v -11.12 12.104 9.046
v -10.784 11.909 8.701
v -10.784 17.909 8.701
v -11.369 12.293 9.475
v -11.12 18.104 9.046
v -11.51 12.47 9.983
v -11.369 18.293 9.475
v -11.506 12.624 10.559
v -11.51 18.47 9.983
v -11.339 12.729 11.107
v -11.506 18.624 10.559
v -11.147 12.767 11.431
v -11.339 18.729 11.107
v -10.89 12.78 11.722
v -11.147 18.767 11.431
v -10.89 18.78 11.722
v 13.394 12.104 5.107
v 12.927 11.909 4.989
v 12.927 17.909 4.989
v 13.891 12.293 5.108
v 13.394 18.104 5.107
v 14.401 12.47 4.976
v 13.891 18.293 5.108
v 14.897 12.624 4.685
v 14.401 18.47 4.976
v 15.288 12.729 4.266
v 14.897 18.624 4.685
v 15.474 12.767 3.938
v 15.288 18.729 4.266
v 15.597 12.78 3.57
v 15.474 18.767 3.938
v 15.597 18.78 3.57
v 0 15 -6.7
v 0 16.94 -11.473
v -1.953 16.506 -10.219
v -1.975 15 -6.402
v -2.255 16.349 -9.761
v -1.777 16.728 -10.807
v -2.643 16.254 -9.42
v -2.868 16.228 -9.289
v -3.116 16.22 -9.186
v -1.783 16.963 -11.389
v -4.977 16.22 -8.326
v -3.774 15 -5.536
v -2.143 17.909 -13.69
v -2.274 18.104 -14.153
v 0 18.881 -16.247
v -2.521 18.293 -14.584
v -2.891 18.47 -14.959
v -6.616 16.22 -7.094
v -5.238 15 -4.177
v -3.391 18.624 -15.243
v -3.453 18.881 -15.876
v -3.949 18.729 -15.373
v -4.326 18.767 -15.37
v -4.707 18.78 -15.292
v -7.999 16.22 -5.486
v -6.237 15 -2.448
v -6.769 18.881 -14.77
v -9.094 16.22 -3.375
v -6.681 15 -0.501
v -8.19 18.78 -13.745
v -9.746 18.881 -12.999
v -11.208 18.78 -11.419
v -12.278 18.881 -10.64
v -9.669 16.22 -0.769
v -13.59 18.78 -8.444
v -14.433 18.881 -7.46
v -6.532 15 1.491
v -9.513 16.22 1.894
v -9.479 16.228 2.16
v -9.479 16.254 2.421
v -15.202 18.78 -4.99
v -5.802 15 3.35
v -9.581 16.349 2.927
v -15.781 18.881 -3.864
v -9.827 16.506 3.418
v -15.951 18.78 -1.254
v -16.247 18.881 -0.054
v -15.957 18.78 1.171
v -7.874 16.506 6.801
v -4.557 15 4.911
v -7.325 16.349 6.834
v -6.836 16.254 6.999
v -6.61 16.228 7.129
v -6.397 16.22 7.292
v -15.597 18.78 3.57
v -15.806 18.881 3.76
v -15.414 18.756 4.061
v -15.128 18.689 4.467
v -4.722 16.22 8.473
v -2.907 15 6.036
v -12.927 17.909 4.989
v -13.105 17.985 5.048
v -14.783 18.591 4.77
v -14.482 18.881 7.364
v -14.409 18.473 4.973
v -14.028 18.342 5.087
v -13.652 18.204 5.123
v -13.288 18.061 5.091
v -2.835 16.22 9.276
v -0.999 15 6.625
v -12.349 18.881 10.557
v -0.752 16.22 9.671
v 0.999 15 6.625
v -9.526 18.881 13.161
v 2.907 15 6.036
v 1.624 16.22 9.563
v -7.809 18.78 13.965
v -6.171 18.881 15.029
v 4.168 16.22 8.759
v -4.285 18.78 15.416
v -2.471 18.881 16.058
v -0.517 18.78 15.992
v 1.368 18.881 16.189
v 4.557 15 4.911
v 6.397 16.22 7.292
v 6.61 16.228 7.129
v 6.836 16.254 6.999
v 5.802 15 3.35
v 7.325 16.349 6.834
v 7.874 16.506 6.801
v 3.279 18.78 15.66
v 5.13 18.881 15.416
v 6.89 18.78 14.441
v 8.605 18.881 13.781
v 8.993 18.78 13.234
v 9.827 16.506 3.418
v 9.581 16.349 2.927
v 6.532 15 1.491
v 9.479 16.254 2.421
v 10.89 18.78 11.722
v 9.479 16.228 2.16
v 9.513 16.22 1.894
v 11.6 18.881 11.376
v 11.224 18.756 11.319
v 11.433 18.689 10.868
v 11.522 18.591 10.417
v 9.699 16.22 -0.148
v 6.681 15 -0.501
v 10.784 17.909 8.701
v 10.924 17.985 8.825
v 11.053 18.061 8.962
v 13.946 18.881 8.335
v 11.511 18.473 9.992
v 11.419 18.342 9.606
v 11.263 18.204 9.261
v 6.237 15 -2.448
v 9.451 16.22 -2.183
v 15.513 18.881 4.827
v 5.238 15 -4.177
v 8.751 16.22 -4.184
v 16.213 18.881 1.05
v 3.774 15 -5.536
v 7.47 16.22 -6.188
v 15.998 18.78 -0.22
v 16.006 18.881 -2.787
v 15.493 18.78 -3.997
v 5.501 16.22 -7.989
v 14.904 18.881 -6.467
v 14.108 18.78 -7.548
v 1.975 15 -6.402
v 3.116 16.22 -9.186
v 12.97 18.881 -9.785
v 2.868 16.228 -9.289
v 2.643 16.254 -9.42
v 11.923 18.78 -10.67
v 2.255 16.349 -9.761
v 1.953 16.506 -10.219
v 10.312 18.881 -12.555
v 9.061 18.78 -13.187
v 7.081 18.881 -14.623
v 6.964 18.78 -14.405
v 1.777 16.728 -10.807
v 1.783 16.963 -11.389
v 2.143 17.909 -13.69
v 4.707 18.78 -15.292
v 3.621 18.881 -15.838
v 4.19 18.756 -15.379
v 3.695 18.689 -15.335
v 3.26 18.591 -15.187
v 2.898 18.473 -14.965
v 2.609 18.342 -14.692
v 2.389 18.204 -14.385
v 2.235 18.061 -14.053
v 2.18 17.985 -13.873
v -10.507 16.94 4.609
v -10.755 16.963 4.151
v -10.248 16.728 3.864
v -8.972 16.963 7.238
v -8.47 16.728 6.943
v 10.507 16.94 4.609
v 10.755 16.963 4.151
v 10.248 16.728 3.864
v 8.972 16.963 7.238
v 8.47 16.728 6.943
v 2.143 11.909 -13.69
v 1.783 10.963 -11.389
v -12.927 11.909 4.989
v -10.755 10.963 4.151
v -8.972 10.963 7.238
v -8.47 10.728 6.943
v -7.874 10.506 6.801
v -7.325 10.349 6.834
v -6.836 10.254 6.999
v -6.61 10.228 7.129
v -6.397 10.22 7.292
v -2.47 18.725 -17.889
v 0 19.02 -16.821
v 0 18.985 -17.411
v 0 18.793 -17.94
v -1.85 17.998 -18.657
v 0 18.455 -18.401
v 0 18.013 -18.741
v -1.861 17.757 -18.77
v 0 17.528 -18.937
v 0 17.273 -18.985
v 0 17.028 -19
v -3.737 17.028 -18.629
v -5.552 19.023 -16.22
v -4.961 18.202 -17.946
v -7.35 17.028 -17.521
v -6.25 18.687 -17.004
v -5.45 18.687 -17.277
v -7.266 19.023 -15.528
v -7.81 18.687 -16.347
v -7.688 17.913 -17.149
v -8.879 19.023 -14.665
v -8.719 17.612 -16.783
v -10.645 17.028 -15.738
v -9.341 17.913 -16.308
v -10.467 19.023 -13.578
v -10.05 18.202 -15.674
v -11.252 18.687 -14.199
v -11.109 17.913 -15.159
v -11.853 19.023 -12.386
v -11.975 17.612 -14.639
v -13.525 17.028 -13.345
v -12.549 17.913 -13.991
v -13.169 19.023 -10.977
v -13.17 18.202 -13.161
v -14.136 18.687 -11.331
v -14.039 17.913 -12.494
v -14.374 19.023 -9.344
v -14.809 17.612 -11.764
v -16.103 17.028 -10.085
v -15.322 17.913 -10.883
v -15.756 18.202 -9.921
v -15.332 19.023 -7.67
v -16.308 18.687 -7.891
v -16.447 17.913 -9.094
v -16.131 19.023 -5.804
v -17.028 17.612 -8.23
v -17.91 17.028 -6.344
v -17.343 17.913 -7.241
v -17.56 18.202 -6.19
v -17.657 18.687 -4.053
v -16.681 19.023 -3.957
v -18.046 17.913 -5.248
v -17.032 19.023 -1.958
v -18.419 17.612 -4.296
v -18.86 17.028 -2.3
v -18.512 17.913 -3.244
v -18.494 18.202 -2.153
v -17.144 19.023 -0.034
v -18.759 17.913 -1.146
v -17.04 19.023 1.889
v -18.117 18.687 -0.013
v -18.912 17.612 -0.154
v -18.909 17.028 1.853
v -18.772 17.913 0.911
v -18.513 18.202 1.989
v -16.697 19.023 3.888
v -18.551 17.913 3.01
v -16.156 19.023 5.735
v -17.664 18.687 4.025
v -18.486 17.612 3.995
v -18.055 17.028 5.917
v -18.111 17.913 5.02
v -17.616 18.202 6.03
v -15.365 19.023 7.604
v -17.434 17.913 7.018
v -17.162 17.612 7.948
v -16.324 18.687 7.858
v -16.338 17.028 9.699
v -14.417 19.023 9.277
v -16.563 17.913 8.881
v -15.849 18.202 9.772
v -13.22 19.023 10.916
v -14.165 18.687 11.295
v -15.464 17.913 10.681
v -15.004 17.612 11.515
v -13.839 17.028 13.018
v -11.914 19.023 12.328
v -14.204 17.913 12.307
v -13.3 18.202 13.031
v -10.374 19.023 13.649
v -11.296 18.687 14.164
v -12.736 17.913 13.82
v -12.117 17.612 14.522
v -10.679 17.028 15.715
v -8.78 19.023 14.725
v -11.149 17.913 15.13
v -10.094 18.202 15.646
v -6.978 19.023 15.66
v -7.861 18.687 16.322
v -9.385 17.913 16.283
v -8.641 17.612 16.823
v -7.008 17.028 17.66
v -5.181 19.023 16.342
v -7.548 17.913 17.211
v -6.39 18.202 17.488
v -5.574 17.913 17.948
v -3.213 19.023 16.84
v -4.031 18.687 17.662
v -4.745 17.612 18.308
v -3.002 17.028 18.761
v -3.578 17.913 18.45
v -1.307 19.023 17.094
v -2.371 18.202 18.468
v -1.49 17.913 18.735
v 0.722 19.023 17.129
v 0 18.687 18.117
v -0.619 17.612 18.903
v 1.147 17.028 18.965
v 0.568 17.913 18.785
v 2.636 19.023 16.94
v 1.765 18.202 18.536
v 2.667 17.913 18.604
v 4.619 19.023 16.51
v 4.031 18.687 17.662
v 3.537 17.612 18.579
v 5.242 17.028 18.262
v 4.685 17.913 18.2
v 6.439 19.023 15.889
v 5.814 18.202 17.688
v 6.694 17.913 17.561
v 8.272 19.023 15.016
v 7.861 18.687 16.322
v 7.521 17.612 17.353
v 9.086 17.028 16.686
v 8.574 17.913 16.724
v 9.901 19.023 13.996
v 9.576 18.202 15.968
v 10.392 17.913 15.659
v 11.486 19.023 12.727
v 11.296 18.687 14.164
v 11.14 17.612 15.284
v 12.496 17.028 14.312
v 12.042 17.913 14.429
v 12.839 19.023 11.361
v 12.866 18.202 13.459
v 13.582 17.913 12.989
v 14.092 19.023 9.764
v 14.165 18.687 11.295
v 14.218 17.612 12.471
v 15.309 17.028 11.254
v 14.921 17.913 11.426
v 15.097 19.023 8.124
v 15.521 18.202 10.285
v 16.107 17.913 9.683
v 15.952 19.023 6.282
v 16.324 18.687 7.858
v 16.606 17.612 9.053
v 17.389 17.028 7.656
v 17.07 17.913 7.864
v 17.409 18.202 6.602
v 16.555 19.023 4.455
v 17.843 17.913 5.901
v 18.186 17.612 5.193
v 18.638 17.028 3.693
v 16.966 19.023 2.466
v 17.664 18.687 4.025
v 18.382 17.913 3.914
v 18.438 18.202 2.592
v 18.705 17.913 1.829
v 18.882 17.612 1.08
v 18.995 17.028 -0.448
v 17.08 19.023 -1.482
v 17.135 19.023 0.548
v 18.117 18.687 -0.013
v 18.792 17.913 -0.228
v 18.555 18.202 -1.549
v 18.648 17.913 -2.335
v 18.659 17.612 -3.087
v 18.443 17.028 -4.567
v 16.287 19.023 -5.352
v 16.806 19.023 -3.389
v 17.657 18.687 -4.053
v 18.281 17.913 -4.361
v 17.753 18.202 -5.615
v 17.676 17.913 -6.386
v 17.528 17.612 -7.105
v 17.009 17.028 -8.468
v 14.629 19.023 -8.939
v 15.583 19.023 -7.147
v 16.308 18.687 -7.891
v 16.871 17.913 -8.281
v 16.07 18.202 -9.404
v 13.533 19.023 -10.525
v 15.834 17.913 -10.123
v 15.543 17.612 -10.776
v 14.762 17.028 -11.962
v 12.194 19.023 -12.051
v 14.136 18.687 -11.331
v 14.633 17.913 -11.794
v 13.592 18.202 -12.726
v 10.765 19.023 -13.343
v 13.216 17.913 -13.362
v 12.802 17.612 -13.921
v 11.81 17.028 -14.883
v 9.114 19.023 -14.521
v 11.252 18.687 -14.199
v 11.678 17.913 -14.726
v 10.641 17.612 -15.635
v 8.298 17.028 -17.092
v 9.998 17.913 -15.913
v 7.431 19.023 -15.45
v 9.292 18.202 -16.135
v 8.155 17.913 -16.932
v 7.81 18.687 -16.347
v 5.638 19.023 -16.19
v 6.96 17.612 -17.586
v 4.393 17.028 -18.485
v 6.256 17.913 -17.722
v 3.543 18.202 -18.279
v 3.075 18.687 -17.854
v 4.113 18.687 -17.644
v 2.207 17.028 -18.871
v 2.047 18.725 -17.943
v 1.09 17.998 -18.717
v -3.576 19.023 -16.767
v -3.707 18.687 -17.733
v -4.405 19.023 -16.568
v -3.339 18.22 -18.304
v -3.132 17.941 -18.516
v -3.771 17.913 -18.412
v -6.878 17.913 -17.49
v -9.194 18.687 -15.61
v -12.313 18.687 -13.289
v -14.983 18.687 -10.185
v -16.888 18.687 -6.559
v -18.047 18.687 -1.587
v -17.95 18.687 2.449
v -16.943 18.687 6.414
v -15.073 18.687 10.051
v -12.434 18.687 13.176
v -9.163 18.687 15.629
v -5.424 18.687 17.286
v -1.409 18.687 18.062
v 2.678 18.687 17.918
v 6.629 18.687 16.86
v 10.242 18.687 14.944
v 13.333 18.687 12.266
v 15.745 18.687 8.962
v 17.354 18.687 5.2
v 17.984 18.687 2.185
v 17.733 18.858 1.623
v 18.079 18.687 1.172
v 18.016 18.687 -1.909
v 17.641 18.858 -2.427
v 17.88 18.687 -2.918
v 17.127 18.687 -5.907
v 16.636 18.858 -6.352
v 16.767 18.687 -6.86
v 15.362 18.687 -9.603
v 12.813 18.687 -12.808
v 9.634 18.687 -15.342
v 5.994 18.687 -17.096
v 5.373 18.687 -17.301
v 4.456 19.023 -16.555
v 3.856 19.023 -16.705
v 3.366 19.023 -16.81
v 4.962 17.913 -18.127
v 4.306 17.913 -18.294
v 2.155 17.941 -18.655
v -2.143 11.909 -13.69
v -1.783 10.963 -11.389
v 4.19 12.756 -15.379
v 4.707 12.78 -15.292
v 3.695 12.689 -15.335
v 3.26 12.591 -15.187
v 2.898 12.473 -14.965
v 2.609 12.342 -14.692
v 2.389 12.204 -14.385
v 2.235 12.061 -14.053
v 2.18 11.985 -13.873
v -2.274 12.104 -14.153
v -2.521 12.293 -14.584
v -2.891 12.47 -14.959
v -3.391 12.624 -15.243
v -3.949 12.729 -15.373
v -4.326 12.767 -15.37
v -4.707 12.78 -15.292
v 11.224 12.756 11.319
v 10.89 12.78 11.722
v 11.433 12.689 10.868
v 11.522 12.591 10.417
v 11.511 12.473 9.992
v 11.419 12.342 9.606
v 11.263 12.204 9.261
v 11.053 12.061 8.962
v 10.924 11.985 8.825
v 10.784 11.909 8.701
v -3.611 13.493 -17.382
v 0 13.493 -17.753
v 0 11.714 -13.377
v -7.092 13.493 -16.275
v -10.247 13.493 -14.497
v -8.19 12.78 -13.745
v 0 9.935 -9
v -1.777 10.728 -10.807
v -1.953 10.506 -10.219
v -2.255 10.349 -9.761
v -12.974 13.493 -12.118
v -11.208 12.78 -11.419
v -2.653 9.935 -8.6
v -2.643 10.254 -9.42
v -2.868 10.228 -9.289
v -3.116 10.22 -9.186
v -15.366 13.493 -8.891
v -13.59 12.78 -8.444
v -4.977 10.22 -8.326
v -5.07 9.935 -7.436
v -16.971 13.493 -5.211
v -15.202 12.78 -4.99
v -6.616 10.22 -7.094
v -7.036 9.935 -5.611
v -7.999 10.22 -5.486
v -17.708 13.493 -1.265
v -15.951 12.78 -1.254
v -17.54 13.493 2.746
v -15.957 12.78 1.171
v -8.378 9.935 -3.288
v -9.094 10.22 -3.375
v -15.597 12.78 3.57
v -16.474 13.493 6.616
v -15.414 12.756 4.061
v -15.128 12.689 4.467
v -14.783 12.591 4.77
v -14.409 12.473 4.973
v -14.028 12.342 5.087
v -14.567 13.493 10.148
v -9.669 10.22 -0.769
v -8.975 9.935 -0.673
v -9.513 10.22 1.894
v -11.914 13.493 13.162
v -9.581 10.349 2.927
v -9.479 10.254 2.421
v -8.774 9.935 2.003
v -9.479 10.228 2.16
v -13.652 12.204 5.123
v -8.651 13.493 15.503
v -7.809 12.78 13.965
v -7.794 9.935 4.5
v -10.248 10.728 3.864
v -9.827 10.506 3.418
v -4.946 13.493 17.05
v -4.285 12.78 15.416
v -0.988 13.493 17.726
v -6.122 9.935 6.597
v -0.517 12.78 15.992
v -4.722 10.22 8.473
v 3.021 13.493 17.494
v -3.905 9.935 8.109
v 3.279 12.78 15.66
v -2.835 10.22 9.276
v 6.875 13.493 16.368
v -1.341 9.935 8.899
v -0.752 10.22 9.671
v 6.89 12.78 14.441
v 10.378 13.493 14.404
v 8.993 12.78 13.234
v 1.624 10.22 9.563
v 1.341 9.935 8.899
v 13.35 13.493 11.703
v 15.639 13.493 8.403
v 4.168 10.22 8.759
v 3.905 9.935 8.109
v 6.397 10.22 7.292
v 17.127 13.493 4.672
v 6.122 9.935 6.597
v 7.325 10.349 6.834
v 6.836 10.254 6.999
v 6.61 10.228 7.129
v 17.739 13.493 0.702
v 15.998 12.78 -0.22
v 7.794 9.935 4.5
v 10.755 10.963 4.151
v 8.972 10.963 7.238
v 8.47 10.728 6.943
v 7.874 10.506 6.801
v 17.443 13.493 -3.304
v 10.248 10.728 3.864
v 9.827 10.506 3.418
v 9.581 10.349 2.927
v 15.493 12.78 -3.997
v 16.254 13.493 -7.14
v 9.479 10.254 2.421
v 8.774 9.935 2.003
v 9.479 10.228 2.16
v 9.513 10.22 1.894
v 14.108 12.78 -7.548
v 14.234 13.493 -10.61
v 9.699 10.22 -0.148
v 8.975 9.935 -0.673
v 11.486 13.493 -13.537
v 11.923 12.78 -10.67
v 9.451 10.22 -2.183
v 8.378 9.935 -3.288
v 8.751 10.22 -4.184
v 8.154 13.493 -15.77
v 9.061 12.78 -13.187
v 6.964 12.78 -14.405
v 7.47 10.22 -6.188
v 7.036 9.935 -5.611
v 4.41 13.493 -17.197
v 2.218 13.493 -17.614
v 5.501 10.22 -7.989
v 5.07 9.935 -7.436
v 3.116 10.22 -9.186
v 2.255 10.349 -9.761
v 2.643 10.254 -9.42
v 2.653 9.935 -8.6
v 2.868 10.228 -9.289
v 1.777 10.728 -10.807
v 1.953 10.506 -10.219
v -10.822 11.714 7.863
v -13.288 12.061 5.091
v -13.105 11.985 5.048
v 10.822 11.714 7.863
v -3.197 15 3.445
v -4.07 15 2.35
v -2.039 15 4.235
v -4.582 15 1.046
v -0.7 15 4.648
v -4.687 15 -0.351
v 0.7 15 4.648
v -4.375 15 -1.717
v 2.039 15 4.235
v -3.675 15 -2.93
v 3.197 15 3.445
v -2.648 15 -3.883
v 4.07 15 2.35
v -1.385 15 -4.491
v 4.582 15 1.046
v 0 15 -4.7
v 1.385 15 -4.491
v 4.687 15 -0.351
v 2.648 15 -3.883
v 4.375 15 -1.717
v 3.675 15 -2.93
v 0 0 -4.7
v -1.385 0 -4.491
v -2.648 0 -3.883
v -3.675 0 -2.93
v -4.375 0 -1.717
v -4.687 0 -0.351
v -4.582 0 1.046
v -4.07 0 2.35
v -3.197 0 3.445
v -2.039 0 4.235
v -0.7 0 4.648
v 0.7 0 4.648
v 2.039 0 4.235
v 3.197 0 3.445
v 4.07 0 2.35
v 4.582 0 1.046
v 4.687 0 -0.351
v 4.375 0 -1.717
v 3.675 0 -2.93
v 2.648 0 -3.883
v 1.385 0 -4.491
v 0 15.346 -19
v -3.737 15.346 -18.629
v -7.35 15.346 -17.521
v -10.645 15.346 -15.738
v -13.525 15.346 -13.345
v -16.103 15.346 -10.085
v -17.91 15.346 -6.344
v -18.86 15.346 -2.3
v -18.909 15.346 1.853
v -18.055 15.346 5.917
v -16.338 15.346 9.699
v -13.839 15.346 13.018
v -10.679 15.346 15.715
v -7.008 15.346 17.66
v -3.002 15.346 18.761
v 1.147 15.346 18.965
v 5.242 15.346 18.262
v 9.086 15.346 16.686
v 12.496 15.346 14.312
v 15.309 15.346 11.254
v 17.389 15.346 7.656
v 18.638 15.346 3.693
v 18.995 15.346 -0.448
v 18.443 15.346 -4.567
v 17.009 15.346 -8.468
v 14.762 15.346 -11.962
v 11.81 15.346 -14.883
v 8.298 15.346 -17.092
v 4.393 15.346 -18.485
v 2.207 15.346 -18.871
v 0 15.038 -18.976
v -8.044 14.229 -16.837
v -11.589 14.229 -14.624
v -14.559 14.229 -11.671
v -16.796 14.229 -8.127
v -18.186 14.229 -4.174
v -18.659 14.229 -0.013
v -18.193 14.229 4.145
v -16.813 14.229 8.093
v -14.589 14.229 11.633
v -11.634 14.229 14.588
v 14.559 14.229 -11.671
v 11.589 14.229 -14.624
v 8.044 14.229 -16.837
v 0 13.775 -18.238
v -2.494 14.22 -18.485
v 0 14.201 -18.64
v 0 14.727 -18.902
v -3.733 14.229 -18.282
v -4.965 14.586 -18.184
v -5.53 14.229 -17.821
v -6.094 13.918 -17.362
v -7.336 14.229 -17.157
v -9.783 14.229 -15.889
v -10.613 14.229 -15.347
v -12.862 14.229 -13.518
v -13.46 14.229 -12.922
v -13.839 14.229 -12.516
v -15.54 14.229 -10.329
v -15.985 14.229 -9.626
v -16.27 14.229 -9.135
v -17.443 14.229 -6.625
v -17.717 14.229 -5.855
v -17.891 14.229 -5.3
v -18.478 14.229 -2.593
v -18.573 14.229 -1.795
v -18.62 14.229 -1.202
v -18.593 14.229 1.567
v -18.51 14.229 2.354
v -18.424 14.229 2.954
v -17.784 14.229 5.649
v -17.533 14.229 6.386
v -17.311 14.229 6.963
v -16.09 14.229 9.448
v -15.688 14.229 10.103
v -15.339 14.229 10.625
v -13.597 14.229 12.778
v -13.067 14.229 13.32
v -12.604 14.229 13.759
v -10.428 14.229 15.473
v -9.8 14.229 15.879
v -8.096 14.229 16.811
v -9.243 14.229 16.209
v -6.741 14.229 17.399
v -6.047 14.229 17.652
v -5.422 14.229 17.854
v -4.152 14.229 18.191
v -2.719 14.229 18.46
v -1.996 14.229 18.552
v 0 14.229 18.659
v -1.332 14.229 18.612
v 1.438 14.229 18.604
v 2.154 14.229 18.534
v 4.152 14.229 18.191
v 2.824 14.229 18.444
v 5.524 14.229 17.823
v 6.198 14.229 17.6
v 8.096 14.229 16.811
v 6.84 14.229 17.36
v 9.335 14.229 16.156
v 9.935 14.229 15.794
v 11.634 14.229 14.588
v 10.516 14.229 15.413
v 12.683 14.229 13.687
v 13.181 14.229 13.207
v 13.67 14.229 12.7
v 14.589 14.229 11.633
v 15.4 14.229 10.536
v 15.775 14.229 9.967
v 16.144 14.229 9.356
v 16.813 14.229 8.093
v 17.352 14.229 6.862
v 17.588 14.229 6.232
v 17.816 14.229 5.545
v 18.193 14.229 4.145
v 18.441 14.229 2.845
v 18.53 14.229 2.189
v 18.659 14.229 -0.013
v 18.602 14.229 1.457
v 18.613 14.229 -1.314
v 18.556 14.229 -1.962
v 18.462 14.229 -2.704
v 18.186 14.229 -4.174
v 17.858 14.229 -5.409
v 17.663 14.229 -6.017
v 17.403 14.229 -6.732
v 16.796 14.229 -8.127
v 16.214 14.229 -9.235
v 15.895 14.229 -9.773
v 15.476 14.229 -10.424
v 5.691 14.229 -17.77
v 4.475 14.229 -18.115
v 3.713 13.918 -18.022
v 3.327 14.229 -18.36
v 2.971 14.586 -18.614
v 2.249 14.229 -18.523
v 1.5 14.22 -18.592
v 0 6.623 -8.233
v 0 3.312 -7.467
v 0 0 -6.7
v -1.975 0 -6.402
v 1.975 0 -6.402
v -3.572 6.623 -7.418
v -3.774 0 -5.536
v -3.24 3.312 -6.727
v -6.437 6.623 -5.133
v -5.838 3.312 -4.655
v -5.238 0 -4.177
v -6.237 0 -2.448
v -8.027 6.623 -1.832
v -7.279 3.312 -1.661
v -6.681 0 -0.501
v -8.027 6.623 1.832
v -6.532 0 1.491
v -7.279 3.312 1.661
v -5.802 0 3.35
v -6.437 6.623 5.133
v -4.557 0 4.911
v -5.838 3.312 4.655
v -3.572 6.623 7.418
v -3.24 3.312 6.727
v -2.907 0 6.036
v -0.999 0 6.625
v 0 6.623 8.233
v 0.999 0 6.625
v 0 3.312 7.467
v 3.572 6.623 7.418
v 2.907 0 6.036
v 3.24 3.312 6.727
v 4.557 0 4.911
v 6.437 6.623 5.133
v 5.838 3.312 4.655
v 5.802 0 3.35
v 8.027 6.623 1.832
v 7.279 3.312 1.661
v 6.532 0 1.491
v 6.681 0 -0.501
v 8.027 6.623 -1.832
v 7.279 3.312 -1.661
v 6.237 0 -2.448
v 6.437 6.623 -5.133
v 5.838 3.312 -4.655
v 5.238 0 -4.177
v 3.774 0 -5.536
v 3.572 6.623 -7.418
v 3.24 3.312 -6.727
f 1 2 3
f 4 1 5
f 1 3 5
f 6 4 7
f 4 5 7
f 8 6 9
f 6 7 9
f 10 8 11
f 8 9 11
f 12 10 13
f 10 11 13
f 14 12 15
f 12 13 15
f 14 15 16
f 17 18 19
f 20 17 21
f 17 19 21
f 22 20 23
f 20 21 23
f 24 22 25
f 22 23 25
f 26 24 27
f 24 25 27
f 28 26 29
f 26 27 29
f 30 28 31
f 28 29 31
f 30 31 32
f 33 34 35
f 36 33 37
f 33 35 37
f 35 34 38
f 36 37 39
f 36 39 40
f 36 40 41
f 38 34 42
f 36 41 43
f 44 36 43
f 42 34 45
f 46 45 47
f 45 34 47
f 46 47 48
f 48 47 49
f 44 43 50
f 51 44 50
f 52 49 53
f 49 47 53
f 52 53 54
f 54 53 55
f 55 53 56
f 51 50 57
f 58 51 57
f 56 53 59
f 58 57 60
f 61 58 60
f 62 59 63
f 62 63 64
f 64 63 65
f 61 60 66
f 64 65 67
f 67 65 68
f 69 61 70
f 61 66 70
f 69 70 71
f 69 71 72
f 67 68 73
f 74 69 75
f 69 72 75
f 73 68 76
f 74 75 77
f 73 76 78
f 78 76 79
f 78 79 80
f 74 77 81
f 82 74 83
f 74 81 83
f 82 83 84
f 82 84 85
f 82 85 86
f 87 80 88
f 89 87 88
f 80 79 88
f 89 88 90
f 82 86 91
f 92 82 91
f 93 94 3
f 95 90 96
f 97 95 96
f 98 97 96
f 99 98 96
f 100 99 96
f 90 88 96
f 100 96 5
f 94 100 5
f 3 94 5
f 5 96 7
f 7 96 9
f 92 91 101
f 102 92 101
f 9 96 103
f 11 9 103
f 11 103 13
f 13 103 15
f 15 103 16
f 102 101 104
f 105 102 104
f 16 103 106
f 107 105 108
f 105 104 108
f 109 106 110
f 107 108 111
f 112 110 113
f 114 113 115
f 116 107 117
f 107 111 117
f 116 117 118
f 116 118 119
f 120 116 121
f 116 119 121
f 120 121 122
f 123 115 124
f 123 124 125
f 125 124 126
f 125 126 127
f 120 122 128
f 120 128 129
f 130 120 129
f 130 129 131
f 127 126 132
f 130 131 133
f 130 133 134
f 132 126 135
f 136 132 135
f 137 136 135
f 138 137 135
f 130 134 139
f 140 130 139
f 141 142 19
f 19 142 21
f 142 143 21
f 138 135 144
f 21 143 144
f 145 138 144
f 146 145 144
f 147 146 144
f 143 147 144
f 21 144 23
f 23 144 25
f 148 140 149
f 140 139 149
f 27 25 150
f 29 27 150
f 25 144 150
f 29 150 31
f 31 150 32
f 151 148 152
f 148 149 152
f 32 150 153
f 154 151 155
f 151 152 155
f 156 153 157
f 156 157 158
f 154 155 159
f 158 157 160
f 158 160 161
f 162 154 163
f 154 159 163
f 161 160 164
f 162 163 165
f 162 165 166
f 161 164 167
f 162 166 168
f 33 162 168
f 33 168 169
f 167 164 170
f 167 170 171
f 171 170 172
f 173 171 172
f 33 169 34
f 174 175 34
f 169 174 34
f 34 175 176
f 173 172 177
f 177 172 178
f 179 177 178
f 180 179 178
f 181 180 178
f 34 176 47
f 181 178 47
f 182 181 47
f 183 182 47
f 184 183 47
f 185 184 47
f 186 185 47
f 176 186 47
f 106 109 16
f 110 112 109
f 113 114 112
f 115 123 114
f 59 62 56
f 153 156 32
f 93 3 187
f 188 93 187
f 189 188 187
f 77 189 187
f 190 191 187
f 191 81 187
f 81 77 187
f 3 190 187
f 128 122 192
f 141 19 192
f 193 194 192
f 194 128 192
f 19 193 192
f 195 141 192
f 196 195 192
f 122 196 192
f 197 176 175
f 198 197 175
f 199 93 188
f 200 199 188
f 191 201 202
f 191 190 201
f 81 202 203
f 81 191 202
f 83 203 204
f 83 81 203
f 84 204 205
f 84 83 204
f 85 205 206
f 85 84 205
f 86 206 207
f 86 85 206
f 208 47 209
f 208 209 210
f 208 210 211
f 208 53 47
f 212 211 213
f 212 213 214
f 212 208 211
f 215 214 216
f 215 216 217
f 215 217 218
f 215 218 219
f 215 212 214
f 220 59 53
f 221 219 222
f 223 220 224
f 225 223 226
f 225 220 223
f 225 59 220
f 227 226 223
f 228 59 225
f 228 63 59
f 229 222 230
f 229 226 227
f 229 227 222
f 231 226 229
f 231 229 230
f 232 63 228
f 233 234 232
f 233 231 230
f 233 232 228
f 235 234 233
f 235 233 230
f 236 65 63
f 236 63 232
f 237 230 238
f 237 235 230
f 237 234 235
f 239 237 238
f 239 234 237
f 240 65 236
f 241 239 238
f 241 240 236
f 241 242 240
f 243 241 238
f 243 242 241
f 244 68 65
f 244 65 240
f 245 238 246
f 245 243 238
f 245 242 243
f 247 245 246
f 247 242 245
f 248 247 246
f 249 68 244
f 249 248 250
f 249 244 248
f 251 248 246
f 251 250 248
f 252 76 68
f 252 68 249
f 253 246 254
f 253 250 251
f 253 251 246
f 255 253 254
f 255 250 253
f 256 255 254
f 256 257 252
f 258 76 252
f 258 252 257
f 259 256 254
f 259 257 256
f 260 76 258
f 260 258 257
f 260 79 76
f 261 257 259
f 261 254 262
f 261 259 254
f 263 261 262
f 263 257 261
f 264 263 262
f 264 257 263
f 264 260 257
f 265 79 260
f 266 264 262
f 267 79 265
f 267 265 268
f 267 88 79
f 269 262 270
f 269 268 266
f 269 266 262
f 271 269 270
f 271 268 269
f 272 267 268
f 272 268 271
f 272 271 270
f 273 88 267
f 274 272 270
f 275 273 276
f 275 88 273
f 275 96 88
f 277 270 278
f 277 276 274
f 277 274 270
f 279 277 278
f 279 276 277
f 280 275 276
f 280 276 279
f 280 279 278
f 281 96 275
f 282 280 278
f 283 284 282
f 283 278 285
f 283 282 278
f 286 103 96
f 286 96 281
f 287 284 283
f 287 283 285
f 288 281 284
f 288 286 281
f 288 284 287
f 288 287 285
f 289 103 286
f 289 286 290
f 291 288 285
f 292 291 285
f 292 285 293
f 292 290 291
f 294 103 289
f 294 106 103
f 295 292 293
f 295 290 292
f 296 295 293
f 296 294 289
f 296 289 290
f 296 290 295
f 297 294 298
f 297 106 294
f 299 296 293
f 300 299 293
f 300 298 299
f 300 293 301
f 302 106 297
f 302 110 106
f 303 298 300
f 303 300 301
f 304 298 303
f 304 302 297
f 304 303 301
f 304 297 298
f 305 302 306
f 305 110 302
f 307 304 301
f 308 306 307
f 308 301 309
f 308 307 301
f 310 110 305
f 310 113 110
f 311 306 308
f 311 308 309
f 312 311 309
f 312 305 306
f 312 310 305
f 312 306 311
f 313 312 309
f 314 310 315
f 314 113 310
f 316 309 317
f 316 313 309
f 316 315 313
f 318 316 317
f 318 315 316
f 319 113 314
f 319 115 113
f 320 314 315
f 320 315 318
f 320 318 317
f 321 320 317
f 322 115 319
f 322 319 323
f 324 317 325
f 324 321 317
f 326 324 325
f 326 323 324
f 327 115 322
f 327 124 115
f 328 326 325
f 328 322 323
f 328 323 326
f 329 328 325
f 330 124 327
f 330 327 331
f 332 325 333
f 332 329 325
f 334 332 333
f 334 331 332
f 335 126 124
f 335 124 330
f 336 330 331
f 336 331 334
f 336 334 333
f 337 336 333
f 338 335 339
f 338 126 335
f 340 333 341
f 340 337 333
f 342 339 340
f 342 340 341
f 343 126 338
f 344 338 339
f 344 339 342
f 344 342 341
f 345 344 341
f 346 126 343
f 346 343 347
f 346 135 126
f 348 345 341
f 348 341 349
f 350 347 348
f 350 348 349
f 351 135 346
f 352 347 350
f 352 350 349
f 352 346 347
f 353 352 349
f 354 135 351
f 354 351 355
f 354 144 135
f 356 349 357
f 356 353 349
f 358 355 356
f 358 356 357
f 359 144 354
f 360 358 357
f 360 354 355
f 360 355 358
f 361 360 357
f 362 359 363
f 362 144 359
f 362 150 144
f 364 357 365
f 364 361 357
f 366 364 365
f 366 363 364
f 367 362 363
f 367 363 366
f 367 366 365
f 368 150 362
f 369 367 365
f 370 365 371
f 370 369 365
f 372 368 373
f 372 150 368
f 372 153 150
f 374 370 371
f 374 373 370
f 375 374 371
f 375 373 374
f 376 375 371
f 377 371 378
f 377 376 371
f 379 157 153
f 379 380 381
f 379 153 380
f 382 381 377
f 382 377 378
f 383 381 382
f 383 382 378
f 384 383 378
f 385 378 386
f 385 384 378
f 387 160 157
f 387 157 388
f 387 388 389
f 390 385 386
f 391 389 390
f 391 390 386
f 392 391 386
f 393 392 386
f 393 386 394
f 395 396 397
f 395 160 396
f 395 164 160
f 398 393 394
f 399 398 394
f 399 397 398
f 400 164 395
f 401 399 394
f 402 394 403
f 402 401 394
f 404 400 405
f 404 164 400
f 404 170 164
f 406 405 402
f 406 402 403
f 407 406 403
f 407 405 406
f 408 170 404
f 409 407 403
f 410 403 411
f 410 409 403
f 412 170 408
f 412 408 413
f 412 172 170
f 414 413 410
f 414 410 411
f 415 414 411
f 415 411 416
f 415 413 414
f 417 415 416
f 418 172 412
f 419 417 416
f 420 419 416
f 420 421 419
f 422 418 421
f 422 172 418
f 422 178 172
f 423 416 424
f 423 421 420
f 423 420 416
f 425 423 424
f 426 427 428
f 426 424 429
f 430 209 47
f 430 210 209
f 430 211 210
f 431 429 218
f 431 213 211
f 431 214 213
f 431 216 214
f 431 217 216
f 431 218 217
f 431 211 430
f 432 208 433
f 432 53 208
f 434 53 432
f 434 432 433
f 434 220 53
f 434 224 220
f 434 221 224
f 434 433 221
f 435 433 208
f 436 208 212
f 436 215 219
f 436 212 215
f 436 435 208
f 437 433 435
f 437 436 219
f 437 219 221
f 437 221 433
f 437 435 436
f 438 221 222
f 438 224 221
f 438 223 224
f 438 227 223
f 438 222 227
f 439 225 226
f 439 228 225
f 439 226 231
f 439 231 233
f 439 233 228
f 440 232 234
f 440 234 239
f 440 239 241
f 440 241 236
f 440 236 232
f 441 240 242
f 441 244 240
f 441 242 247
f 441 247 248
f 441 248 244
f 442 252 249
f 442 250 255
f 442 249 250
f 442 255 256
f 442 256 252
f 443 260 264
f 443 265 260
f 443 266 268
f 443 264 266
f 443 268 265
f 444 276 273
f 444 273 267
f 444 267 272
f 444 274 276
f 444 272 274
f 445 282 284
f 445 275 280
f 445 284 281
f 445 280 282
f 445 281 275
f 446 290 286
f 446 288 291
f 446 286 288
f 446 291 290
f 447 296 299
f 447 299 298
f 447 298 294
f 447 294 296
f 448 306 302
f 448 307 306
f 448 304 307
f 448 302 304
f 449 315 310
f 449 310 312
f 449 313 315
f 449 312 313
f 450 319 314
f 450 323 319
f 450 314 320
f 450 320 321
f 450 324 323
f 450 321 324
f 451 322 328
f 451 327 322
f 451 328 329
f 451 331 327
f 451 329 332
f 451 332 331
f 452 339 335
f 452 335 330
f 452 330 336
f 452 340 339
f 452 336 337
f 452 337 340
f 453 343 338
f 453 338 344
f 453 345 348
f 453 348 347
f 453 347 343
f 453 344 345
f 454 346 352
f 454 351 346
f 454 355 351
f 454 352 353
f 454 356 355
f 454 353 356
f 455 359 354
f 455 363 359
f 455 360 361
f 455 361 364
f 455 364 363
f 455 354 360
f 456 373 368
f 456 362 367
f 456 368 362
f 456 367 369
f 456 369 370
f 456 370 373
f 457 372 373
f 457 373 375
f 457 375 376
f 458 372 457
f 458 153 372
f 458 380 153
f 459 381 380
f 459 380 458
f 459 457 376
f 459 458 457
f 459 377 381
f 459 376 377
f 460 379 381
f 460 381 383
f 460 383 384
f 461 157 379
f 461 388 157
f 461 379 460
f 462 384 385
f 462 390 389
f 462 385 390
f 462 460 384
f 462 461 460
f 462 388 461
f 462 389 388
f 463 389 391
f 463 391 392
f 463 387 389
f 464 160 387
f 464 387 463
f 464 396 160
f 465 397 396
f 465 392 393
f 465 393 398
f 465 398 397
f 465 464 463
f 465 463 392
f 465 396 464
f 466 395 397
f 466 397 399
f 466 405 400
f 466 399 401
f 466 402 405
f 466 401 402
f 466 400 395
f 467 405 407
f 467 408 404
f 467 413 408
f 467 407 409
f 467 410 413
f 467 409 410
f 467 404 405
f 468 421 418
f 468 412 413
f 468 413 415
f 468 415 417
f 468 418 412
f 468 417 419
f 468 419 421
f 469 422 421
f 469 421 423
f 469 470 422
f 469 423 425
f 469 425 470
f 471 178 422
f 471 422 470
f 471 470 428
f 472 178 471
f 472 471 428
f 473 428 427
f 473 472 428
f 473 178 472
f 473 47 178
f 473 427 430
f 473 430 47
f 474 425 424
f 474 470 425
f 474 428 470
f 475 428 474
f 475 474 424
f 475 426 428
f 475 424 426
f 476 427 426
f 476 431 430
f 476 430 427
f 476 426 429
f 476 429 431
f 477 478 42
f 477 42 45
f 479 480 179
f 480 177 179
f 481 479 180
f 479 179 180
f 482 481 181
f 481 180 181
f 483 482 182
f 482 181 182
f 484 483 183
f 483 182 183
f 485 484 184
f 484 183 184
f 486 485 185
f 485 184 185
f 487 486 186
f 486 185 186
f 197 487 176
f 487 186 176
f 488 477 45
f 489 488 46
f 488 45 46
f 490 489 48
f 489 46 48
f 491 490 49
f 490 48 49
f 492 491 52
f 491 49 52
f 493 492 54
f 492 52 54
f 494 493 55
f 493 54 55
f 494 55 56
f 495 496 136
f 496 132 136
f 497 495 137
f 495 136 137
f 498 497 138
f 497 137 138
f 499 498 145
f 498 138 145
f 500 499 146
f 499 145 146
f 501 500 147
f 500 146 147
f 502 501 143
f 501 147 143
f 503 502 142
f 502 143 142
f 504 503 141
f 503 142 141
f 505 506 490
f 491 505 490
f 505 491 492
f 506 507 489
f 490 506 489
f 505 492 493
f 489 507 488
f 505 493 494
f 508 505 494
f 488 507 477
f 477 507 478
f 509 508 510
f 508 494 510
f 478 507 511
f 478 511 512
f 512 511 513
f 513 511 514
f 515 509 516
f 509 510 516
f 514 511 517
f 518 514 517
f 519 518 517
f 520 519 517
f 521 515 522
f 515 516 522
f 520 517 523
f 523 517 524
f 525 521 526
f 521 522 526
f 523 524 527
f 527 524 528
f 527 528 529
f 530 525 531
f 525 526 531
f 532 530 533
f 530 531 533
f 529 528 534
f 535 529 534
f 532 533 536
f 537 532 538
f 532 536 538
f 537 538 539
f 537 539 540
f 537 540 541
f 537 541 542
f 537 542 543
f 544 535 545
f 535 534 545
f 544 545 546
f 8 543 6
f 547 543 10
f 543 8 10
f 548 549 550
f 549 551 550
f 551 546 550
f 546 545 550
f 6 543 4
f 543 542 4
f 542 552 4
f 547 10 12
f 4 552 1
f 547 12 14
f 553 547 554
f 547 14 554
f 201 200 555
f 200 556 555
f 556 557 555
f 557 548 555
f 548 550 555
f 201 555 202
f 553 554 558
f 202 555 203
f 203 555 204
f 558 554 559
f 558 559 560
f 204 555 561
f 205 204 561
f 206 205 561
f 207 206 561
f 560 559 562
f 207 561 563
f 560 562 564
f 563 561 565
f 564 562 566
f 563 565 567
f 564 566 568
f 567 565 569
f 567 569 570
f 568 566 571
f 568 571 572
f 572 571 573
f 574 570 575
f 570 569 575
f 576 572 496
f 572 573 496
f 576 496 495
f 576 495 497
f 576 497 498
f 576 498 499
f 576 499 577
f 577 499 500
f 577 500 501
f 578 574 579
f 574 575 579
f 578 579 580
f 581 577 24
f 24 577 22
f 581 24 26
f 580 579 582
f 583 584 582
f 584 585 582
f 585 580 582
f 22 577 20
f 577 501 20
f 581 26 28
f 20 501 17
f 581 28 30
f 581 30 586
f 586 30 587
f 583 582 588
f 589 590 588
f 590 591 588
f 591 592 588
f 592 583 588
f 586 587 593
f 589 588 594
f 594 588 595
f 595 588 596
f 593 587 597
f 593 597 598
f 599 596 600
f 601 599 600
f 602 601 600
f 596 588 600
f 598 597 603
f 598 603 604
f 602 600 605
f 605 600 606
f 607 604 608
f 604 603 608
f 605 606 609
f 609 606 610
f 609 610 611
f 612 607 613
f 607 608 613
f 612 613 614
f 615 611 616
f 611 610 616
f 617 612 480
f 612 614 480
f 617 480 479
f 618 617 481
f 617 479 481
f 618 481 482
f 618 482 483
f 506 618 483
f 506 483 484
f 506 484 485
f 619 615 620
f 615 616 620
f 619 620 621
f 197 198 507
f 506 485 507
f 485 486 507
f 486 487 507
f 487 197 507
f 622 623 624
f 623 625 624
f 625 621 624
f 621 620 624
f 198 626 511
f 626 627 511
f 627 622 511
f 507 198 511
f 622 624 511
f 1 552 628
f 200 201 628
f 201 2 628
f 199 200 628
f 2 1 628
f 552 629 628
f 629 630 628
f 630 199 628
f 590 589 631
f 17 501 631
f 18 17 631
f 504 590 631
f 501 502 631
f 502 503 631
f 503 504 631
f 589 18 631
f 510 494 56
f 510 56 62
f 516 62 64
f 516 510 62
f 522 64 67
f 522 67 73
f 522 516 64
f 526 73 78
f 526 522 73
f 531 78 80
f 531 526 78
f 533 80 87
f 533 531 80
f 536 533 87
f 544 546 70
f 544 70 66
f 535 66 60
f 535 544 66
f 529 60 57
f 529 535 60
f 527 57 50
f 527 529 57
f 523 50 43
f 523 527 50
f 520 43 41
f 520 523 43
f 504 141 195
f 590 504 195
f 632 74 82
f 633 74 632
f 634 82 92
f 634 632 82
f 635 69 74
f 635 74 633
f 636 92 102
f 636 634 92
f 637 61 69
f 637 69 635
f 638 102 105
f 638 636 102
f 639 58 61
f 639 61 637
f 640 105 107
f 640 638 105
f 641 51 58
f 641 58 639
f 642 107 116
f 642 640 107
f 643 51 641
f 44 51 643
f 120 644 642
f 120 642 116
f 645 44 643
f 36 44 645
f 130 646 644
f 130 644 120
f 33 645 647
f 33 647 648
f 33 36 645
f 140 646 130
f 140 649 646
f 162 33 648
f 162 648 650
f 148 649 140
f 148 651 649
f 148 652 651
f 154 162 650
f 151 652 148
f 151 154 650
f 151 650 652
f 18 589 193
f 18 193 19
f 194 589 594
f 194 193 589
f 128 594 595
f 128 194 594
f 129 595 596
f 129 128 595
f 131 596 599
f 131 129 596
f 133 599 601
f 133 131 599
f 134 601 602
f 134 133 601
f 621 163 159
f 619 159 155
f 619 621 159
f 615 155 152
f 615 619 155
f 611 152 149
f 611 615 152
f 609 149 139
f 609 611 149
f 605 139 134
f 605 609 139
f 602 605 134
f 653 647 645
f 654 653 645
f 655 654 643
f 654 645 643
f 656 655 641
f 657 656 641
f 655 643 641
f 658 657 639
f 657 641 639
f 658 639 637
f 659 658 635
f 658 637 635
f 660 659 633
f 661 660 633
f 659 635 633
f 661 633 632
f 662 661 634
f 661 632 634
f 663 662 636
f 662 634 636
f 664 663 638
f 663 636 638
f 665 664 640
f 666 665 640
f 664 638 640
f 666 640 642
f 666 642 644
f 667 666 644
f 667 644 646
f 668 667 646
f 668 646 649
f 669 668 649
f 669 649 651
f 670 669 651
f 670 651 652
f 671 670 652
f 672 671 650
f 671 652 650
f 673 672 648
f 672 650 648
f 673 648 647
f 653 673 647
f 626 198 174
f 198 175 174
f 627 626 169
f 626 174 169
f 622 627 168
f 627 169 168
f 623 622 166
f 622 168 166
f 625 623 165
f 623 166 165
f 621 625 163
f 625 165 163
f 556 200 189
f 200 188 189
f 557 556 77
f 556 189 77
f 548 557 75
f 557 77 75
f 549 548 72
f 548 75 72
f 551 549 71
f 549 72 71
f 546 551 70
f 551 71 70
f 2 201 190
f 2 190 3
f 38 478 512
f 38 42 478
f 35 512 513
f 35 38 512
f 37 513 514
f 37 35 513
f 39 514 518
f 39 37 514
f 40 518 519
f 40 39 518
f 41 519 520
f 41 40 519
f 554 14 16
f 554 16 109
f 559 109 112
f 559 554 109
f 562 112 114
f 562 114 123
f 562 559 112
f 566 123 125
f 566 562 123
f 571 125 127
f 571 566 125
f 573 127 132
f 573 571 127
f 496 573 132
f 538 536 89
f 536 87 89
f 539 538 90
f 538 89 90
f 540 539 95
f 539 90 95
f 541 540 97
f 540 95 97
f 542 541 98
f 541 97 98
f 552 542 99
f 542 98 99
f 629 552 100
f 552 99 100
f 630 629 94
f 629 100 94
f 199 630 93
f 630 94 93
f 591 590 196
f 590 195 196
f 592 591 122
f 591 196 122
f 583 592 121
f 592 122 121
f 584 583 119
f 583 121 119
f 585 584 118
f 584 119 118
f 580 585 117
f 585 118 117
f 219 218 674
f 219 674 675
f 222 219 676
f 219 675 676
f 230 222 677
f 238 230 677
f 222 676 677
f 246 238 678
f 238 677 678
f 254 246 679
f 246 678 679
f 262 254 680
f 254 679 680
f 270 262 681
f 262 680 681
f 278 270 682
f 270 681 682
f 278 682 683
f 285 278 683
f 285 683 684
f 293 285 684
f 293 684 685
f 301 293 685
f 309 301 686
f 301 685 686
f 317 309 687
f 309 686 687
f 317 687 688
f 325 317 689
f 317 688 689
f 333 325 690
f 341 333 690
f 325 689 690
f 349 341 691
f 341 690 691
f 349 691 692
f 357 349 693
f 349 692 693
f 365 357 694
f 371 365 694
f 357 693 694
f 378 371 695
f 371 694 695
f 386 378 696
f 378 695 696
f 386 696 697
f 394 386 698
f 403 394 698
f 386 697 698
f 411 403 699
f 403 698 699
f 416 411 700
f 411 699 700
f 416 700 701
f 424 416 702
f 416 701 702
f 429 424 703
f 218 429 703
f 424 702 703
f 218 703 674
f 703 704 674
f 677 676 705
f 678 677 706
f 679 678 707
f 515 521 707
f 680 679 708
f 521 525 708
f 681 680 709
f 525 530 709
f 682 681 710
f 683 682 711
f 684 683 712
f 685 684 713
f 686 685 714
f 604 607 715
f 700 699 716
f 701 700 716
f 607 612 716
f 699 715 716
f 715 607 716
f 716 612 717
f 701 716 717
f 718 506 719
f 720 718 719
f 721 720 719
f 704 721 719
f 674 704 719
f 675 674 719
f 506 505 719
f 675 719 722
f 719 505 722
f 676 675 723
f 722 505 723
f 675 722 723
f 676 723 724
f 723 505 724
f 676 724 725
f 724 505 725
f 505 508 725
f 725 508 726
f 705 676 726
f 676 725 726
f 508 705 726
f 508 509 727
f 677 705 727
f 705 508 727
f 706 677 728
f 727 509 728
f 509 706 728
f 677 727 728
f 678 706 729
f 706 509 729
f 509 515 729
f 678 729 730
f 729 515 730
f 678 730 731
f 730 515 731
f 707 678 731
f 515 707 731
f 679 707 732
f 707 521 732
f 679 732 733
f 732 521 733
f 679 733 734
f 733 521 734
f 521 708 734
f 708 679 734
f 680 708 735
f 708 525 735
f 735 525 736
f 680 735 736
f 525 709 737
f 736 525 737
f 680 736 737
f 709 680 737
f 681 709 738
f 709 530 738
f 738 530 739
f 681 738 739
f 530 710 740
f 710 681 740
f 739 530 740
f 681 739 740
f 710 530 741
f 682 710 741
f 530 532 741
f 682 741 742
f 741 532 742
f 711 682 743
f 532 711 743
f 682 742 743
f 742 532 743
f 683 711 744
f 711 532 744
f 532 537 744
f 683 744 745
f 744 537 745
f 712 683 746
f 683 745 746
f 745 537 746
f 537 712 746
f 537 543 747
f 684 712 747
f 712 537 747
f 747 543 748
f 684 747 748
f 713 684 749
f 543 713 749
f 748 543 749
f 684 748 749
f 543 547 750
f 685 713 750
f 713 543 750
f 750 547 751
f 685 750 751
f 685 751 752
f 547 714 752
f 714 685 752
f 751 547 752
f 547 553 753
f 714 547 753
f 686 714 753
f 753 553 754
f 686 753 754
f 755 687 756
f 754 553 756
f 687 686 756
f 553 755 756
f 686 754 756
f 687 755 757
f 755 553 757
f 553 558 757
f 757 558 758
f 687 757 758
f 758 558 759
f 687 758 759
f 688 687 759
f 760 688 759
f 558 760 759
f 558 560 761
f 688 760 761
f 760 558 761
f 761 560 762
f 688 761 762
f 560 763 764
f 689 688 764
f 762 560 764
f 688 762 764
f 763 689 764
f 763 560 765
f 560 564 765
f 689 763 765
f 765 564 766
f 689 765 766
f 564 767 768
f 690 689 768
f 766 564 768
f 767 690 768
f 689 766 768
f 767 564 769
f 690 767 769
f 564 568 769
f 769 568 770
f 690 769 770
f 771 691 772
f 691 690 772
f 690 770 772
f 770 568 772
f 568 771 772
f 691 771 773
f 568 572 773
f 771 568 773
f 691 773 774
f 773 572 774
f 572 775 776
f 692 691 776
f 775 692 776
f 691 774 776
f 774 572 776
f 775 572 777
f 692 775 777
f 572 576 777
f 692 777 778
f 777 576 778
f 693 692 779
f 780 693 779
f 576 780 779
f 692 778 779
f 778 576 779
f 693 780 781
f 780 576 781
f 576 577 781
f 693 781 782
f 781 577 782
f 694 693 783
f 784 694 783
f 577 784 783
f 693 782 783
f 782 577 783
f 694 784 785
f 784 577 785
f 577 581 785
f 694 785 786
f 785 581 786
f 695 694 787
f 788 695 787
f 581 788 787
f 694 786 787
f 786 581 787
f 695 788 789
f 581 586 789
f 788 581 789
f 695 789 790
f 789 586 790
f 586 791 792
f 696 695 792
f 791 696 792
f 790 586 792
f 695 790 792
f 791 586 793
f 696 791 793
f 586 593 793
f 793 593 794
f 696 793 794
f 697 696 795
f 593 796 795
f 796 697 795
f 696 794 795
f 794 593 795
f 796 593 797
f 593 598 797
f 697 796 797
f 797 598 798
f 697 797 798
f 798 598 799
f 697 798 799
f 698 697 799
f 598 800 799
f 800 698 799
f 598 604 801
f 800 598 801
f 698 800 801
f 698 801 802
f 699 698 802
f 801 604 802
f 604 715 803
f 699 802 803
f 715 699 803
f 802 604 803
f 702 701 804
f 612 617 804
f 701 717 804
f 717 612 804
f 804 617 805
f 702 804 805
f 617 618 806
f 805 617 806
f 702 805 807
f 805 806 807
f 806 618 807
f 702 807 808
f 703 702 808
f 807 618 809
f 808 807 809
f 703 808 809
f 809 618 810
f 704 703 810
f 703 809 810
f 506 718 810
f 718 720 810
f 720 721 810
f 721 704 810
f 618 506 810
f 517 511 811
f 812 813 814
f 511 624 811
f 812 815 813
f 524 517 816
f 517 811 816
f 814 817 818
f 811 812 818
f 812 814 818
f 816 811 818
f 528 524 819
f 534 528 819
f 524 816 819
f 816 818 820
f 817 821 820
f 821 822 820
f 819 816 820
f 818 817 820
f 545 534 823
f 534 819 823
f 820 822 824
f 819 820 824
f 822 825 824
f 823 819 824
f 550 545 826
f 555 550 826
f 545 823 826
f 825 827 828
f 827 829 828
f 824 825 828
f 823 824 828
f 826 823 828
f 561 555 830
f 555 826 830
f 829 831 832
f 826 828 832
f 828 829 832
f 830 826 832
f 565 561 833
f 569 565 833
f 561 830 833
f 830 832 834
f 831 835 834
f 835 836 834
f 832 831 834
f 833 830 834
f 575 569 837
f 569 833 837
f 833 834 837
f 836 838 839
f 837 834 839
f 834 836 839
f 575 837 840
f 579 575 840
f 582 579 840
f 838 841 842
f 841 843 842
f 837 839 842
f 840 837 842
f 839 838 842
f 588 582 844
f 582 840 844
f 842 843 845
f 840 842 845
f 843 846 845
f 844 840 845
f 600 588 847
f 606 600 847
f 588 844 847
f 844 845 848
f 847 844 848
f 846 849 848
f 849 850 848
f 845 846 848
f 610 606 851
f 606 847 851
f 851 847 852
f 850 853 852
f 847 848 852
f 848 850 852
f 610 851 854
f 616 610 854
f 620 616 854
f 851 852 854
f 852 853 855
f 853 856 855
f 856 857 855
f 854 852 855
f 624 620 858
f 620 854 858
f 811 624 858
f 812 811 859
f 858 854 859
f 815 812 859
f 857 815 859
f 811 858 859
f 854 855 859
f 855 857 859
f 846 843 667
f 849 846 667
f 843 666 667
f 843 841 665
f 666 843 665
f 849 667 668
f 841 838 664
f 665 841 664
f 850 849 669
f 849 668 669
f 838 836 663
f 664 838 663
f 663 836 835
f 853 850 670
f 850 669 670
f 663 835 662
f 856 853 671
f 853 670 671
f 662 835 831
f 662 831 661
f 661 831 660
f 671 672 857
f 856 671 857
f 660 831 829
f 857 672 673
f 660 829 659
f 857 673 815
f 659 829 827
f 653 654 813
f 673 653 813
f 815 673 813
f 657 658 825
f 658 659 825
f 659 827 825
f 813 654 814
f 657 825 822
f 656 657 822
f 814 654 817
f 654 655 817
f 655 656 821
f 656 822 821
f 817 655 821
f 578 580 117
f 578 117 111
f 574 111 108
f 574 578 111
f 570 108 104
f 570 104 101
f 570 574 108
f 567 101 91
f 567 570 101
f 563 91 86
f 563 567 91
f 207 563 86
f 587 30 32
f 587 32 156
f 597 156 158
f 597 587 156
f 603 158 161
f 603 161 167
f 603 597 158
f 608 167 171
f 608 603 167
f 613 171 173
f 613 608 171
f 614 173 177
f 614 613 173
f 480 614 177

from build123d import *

# Parameters (mm, degrees)
ENL_V_MAT_EXTRU_1_DEPTH      = 34.496268449
ENL_V_MAT_EXTRU_1_DEPTH_BACK = 34.496268449
CONG_1_R                     = 2
CONG_2_R                     = 2
ENL_V_START                  = -5
ESQUISSE4_R                  = 6.7
ENL_V_MAT_EXTRU_2_DEPTH      = 5


with BuildPart() as part:
    # Esquisse2 → Révolution1 (revolve)
    with BuildSketch(Plane.XY, mode=Mode.PRIVATE) as r_volution1_sk:
        Polygon((4.7, 0), (4.7, 20), (6.7, 20), (6.7, 15), (19, 20), (19, 14), (9, 9.93495935), (6.7, 0), align=None)
    revolve(r_volution1_sk.sketch.rotate(Axis((0, 0, 0), (0, 1, 0)), 90), axis=Axis((0, 0, 0), (0, 1, 0)))

    # Esquisse3 → Enlèv. mat.-Extru.1 (cut, two sides: drawn at the far end of the back side and taken through both)
    with BuildSketch(Plane(origin=(0, 20, 0), x_dir=(1, 0, 0), z_dir=(0, 1, 0)).offset(-ENL_V_MAT_EXTRU_1_DEPTH_BACK)):
        with BuildLine():
            Line((-1.5, 9.583318841), (-2.474226804, 15.807536232))
            ThreePointArc((-2.474226804, 15.807536232), (-13.856406461, 8), (-14.92684135, -5.761024849))
            Line((-14.92684135, -5.761024849), (-9.049397568, -3.492621315))
            ThreePointArc((-9.049397568, -3.492621315), (-8.400446417, 4.85), (-1.5, 9.583318841))
        make_face()
        with BuildLine():
            Line((9.049397568, -3.492621315), (14.92684135, -5.761024849))
            ThreePointArc((14.92684135, -5.761024849), (13.856406461, 8), (2.474226804, 15.807536232))
            Line((2.474226804, 15.807536232), (1.5, 9.583318841))
            ThreePointArc((1.5, 9.583318841), (8.400446417, 4.85), (9.049397568, -3.492621315))
        make_face()
        with BuildLine():
            Line((-7.549397568, -6.090697526), (-12.452614546, -10.046511383))
            ThreePointArc((-12.452614546, -10.046511383), (0, -16), (12.452614546, -10.046511383))
            Line((12.452614546, -10.046511383), (7.549397568, -6.090697526))
            ThreePointArc((7.549397568, -6.090697526), (0, -9.7), (-7.549397568, -6.090697526))
        make_face()
    extrude(amount=ENL_V_MAT_EXTRU_1_DEPTH + ENL_V_MAT_EXTRU_1_DEPTH_BACK, mode=Mode.SUBTRACT)

    # Congé1
    cong_1_edges = [part.edges().sort_by_distance(p)[0] for p in [
        (0, 14, 19),
        (0, 20, 19),
    ]]
    fillet(cong_1_edges, radius=CONG_1_R)

    # Congé2
    cong_2_edges = [part.edges().sort_by_distance(p)[0] for p in [
        (-14.92684135, 15.780487805, 5.761024849),
        (-2.474226804, 15.780487805, -15.807536232),
        (-1.5, 13.219512195, -9.583318841),
        (-9.049397568, 13.219512195, 3.492621315),
        (2.474226804, 15.780487805, -15.807536232),
        (14.92684135, 15.780487805, 5.761024849),
        (9.049397568, 13.219512195, 3.492621315),
        (1.5, 13.219512195, -9.583318841),
        (12.452614546, 15.780487805, 10.046511383),
        (-12.452614546, 15.780487805, 10.046511383),
        (-7.549397568, 13.219512195, 6.090697526),
        (7.549397568, 13.219512195, 6.090697526),
    ]]
    fillet(cong_2_edges, radius=CONG_2_R)

    # Esquisse4 → Enlèv. mat.-Extru.2 (cut)
    with BuildSketch(Plane(origin=(0, 20, 0), x_dir=(1, 0, 0), z_dir=(0, 1, 0)).offset(ENL_V_START)):
        Circle(ESQUISSE4_R)
    extrude(amount=ENL_V_MAT_EXTRU_2_DEPTH, mode=Mode.SUBTRACT)


solid = part.part
